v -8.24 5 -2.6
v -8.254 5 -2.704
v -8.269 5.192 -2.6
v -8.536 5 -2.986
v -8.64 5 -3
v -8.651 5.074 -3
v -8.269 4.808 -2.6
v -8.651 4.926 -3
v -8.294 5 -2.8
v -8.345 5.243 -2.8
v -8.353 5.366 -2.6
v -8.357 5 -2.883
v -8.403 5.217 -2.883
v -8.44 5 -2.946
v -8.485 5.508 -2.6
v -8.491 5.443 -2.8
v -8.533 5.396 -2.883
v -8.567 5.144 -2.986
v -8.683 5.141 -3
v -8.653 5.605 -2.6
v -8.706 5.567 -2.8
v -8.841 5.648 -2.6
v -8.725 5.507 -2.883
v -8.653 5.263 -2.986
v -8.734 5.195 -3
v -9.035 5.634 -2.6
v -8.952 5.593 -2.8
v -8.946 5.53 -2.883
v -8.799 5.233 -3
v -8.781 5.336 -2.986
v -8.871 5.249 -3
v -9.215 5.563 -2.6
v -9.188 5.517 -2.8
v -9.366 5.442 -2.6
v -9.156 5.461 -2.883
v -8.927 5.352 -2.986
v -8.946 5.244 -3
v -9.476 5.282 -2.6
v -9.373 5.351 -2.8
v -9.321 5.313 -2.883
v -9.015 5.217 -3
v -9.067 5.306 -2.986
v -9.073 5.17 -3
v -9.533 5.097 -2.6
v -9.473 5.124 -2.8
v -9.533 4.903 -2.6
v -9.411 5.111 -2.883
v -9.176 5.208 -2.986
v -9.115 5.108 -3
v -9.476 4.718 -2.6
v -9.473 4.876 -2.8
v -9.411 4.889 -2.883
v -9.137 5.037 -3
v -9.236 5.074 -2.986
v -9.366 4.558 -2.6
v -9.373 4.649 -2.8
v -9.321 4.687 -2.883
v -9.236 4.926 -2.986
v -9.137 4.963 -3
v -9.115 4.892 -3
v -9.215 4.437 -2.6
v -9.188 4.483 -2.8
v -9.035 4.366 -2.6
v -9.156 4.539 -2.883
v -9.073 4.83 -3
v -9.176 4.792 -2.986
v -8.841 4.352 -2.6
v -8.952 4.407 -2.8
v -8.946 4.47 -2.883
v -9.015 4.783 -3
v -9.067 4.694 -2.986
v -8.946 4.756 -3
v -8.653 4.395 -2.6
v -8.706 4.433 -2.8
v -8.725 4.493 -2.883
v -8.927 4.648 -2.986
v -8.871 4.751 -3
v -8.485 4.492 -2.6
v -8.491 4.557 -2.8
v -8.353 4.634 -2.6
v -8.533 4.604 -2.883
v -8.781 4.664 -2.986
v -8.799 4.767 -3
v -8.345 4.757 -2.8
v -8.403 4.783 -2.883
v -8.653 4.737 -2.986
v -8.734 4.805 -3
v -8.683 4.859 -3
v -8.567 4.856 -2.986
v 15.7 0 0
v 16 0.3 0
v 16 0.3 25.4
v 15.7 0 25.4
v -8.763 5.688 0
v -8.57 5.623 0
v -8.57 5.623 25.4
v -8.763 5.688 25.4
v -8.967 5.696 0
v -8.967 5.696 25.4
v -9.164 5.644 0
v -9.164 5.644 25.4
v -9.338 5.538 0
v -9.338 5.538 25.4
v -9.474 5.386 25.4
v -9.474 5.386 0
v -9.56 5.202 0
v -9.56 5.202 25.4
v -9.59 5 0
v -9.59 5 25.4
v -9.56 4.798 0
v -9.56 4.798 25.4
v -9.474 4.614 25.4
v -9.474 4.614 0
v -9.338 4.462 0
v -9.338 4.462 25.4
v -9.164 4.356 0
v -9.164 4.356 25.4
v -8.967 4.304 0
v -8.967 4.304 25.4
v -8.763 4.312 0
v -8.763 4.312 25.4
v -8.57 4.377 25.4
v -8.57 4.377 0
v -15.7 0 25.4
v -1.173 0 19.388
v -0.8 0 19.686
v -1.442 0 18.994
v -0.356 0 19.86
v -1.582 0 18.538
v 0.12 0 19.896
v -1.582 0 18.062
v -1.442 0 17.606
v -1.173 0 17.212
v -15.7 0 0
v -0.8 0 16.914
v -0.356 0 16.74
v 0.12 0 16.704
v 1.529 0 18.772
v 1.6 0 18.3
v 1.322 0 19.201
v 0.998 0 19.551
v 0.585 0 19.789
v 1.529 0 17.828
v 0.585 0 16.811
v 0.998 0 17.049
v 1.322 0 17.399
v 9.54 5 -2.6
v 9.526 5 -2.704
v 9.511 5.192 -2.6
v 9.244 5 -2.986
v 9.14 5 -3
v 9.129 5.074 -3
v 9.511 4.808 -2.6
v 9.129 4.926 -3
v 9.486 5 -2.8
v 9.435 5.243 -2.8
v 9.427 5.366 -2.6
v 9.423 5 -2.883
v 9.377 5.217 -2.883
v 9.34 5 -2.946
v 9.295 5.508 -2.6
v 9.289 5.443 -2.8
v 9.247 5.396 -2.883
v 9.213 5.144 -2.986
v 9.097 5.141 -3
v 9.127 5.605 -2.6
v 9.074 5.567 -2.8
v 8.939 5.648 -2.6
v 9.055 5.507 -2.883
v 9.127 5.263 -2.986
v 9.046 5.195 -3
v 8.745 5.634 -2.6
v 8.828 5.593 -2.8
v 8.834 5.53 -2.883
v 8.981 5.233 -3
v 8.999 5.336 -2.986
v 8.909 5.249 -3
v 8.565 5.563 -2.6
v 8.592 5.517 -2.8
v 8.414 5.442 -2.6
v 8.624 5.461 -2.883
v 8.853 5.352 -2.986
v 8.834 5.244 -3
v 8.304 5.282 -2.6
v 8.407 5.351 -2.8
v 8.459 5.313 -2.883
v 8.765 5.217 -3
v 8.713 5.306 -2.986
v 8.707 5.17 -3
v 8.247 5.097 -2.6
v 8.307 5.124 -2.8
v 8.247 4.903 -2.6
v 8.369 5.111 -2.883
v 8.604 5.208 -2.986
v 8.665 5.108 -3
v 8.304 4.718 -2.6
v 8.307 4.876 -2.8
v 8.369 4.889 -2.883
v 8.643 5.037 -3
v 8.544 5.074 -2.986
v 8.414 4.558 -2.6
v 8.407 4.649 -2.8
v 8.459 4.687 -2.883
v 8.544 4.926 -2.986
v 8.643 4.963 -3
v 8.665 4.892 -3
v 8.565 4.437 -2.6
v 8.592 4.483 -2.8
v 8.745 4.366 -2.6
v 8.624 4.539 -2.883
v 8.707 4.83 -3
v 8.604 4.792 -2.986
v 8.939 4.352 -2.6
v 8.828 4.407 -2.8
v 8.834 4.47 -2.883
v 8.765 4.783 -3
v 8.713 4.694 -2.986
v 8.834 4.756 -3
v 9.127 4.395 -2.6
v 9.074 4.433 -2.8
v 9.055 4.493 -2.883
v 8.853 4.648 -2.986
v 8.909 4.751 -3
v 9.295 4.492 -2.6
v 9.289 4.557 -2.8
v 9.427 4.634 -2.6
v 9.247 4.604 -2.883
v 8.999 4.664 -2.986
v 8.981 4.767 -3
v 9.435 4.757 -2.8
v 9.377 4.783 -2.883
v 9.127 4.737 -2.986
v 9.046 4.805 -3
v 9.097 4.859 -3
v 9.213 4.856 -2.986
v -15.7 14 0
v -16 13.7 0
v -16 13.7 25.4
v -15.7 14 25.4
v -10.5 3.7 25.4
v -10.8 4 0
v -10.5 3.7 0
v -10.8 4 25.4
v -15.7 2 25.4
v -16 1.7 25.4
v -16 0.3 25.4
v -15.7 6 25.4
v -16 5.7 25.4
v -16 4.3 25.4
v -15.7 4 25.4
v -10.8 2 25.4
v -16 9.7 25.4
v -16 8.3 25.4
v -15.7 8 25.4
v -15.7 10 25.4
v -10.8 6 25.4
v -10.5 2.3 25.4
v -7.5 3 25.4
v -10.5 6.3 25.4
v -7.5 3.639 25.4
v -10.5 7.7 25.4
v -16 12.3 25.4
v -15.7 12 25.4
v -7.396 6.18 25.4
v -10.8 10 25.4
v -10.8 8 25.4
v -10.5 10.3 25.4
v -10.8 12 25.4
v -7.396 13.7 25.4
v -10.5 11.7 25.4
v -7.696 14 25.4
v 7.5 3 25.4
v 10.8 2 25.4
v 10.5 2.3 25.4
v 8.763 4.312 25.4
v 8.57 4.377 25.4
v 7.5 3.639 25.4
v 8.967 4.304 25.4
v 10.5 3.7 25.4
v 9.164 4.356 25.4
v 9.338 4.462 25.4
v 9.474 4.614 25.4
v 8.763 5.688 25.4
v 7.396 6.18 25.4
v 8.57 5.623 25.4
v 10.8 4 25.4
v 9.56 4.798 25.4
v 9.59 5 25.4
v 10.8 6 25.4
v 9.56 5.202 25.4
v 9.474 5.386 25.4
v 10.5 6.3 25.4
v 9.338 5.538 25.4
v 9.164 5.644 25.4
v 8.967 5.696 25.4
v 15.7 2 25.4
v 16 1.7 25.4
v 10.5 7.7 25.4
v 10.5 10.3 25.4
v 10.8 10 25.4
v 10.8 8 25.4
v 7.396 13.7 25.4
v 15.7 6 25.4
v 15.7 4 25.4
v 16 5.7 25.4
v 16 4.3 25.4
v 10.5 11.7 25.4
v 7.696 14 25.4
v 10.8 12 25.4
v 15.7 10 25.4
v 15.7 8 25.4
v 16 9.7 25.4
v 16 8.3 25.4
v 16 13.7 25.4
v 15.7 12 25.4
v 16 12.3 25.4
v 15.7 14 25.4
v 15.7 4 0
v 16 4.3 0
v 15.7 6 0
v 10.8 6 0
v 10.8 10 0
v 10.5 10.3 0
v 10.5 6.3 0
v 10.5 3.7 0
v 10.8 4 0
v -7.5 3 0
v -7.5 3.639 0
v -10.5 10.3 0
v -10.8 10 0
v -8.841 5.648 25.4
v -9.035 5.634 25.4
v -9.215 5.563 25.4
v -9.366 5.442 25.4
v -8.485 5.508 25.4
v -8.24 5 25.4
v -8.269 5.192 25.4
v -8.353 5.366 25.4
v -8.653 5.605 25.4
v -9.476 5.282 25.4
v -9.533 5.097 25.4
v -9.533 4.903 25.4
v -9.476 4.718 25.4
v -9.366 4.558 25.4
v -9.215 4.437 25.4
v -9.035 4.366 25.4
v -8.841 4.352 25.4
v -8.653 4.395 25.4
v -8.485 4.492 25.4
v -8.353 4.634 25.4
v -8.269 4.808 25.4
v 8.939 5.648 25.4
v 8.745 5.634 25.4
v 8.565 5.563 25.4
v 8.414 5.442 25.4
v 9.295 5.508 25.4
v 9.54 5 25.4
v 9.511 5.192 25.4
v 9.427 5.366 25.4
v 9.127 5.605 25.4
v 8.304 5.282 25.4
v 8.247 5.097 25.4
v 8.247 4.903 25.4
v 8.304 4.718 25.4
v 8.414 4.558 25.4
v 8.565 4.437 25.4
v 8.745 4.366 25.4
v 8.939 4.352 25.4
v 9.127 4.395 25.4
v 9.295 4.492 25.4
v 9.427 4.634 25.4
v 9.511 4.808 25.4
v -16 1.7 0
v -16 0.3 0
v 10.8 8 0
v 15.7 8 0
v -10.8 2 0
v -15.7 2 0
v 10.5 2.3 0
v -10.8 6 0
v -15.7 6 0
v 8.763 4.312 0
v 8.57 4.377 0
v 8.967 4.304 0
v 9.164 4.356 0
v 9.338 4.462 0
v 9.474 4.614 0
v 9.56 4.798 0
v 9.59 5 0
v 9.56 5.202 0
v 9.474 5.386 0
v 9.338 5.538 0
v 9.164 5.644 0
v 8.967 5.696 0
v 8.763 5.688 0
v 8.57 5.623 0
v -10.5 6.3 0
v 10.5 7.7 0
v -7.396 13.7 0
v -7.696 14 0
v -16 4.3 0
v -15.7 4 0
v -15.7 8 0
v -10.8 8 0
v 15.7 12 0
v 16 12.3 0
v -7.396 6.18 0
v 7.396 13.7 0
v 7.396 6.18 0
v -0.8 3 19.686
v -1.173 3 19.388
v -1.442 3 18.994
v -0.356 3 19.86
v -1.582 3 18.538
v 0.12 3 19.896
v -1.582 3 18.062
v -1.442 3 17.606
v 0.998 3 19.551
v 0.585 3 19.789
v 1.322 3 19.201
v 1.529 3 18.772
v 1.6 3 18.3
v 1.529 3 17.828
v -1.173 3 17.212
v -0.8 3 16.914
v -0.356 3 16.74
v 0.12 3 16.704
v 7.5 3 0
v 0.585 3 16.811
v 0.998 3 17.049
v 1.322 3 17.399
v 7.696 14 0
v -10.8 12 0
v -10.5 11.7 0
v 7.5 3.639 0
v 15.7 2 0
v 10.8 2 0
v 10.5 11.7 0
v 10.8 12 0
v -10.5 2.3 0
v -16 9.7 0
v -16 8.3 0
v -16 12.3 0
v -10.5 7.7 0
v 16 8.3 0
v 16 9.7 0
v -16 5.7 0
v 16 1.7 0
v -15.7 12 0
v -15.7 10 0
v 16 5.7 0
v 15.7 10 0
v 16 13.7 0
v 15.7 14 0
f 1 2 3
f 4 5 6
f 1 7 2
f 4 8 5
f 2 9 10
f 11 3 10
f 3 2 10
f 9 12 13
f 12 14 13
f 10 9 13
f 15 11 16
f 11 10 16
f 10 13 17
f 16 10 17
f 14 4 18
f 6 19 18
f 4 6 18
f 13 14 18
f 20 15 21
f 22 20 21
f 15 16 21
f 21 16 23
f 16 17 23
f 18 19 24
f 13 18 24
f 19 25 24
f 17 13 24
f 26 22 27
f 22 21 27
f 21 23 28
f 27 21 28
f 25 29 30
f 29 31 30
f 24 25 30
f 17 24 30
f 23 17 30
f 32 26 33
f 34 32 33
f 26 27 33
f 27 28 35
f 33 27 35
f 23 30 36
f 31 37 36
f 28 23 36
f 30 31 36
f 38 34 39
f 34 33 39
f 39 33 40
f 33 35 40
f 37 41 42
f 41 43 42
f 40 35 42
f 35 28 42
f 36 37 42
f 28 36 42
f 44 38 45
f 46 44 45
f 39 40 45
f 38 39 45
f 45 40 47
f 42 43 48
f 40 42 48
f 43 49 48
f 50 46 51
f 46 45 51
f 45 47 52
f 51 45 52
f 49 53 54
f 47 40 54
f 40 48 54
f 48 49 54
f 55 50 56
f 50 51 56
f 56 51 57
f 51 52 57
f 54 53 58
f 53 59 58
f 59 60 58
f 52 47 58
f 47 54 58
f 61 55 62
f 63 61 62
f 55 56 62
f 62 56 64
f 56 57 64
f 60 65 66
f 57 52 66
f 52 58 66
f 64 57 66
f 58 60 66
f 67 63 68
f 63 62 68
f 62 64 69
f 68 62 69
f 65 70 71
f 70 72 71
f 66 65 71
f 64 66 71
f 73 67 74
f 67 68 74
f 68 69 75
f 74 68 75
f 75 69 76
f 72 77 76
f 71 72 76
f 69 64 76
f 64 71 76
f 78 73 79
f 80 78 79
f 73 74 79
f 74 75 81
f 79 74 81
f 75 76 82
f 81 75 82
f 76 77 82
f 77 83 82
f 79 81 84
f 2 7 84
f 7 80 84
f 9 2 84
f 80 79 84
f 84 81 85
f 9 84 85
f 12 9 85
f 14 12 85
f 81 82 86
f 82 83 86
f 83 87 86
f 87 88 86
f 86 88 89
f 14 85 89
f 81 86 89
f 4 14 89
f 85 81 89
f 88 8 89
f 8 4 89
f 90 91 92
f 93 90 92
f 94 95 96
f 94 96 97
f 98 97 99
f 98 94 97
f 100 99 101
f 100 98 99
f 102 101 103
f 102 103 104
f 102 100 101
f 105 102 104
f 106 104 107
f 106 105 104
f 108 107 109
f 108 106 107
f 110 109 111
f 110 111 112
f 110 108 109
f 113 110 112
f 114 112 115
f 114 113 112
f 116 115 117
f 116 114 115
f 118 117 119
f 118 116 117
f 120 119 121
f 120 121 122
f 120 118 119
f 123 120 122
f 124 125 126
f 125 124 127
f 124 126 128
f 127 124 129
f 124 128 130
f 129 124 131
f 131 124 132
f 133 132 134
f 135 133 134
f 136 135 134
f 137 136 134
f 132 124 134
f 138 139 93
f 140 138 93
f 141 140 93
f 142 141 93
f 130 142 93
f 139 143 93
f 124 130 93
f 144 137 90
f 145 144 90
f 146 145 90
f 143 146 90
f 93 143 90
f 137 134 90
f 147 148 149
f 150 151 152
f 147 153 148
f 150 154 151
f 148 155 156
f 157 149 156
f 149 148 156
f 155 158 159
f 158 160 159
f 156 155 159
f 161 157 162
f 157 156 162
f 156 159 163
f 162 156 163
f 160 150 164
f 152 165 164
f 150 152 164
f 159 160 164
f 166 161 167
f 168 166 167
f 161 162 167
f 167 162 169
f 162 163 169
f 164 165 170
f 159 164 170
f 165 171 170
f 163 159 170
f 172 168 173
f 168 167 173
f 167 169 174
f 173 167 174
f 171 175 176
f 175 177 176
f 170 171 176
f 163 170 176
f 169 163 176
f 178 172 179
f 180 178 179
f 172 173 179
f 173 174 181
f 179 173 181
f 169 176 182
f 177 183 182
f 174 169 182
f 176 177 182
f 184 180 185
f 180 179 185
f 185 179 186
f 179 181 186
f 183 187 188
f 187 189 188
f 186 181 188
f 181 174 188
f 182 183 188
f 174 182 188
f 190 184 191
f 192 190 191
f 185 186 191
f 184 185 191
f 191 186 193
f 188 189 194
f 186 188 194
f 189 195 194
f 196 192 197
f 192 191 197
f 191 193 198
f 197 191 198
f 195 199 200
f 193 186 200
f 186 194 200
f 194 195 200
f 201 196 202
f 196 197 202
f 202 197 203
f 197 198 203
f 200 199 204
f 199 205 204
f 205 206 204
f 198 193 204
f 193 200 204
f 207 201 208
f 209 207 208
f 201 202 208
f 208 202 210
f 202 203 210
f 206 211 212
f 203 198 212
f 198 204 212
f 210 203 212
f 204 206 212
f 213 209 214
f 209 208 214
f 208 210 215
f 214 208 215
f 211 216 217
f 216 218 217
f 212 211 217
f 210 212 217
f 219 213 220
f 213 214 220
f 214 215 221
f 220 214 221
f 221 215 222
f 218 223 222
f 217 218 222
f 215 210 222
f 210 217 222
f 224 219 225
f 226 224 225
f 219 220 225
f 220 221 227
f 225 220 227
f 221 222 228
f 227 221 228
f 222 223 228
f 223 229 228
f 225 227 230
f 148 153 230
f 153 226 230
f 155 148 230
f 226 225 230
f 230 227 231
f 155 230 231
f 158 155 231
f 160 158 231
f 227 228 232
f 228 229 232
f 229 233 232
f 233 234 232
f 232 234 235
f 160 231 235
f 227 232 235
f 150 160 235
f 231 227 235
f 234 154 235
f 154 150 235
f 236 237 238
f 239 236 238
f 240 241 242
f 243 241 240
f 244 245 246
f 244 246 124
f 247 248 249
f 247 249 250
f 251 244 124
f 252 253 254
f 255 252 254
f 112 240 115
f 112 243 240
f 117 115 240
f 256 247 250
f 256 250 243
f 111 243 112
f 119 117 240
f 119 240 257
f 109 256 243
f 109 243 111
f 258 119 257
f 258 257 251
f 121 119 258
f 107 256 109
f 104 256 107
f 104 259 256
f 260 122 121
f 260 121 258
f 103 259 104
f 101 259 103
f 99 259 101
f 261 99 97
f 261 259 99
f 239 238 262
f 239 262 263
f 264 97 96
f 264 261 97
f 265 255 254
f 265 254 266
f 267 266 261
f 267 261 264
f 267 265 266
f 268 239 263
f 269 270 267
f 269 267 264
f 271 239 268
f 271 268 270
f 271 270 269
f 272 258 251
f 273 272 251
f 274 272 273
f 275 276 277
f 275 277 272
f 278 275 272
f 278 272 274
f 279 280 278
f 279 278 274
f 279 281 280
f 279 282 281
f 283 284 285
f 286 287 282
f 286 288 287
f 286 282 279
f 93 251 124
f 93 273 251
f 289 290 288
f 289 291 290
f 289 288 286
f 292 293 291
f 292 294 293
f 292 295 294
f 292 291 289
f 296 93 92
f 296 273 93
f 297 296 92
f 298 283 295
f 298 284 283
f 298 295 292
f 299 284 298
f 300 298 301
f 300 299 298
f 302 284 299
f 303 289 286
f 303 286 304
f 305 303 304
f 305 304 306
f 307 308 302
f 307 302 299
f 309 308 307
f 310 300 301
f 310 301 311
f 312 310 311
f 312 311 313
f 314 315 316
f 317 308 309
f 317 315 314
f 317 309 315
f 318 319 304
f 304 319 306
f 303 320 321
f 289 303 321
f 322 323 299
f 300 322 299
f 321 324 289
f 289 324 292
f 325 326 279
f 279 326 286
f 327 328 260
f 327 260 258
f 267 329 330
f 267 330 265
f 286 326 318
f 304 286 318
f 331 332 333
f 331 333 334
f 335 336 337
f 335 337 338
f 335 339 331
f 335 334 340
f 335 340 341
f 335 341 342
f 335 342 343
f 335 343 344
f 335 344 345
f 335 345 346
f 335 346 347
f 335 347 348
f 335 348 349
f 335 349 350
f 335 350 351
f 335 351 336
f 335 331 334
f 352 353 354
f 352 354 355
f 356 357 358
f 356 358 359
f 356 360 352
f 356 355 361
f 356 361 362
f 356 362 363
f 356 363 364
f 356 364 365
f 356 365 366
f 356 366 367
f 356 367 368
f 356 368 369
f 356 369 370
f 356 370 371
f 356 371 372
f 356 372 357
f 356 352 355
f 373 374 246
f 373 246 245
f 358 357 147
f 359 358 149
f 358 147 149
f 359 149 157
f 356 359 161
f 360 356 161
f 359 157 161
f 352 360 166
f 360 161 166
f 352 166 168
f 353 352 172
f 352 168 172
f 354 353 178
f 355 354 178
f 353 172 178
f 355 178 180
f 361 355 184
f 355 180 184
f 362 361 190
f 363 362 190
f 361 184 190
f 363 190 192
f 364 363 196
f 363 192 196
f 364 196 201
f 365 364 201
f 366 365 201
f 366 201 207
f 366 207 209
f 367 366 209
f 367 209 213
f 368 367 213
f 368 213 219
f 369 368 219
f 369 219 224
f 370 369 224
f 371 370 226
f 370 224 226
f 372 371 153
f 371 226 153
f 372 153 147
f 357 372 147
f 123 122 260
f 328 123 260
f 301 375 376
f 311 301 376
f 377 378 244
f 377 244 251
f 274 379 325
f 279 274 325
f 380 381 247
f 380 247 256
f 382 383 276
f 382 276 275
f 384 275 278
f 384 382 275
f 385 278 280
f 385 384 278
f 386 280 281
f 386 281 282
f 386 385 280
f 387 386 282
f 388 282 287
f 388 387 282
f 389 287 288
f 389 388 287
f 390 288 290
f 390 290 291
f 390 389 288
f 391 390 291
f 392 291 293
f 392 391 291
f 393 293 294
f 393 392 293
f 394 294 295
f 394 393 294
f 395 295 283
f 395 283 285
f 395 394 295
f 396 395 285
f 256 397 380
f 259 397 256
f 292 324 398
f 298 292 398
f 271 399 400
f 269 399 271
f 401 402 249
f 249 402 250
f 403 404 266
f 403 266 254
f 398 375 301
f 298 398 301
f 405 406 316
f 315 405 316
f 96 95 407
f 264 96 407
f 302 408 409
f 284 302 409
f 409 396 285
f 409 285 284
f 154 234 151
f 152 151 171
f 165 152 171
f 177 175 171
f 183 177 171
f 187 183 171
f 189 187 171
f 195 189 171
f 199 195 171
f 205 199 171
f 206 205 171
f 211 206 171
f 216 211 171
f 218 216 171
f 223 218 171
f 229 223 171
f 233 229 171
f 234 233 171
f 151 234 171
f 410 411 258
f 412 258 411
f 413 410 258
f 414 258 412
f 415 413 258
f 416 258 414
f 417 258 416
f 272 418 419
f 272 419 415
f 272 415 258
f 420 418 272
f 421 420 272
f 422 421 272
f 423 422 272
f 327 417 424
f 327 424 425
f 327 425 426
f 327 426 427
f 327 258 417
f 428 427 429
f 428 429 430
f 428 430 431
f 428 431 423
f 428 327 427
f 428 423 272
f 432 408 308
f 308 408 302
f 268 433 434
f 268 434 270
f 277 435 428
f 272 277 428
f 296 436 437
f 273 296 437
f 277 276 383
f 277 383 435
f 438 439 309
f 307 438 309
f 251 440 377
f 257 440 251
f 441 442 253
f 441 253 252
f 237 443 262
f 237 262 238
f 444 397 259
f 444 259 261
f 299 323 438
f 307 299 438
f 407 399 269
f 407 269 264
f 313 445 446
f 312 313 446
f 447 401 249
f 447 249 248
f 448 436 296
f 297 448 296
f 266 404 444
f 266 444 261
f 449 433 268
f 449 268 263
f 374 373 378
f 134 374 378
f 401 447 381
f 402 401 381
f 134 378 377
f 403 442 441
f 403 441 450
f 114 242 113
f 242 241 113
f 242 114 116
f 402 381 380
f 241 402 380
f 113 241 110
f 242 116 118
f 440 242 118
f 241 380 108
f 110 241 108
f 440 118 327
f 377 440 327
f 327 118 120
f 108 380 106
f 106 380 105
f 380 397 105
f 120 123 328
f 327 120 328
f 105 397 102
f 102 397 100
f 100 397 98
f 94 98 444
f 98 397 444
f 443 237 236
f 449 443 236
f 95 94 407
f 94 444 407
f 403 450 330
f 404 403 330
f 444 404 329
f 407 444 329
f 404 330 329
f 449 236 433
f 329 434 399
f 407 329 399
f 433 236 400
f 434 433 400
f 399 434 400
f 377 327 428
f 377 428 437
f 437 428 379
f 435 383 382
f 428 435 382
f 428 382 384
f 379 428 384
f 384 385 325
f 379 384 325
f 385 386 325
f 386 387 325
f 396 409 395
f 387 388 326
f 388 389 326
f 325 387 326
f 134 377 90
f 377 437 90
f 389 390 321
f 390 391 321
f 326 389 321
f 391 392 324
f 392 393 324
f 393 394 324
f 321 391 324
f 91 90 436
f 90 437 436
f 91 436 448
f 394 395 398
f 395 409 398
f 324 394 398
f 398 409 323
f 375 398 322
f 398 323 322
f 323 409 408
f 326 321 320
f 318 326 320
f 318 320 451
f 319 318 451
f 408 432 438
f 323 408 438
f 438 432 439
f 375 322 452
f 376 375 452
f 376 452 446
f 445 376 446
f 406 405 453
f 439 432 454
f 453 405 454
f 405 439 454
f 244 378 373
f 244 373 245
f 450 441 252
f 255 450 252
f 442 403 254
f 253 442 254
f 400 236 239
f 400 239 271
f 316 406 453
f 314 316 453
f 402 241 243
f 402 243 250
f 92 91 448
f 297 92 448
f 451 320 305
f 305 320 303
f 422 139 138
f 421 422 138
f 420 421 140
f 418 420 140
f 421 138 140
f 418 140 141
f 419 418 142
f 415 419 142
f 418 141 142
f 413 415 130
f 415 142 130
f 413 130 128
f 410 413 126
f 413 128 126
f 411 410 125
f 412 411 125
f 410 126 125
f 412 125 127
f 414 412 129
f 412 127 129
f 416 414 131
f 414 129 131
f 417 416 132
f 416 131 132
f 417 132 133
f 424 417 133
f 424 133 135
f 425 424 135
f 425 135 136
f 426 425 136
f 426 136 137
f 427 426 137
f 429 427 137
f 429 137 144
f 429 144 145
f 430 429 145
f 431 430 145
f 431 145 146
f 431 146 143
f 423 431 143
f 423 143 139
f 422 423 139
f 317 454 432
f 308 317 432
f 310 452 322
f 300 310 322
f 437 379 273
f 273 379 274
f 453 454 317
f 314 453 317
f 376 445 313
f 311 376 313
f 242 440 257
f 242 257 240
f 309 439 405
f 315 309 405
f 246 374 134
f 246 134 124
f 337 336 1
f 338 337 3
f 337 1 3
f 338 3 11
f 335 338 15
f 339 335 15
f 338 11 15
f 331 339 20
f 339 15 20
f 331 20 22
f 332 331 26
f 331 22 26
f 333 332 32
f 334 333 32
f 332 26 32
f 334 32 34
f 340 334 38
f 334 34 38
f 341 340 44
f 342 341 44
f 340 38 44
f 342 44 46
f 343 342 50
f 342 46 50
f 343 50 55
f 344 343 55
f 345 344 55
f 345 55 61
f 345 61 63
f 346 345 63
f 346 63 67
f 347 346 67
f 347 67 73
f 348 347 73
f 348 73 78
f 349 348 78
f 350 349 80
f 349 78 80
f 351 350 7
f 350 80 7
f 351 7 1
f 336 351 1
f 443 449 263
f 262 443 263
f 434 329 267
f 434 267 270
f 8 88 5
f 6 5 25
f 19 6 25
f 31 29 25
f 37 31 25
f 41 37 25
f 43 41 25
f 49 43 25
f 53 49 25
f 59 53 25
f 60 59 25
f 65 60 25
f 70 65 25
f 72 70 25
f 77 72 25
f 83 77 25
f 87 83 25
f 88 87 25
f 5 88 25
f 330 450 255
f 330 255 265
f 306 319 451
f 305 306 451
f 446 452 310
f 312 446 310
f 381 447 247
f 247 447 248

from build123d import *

# Parameters (mm, degrees)
PAD_DEPTH       = 25.4
SKETCH001_R     = 1.6
POCKET_DEPTH    = 14.001
CHAMFER_SIZE    = 0.3
CHAMFER001_SIZE = 0.3
CHAMFER002_SIZE = 0.3
CHAMFER003_SIZE = 0.3
CHAMFER004_SIZE = 0.3
SKETCH002_R     = 0.65
PAD001_DEPTH    = 28.4
FILLET_R        = 0.4
SKETCH003_R     = 0.65
PAD002_DEPTH    = 28.4
FILLET001_R     = 0.4


with BuildPart() as body:
    # Sketch → Pad (new body)
    with BuildSketch(Plane.XY):
        with BuildLine():
            Line((-16, 0), (16, 0))
            Line((16, 0), (16, 2))
            Line((16, 2), (10.5, 2))
            Line((10.5, 2), (10.5, 4))
            Line((10.5, 4), (16, 4))
            Line((16, 4), (16, 6))
            Line((16, 6), (10.5, 6))
            Line((10.5, 6), (10.5, 8))
            Line((10.5, 8), (16, 8))
            Line((16, 8), (16, 10))
            Line((16, 10), (10.5, 10))
            Line((10.5, 10), (10.5, 12))
            Line((10.5, 12), (16, 12))
            Line((16, 12), (16, 14))
            Line((16, 14), (7.395549, 14))
            Line((7.395549, 14), (7.395549, 6.18))
            Line((8.569968, 5.622559), (7.395549, 6.18))
            ThreePointArc((8.569968, 4.377441), (9.59, 5), (8.569968, 5.622559))
            Line((8.569968, 4.377441), (7.5, 3.639086))
            Line((7.5, 3.639086), (7.5, 3))
            Line((-7.5, 3), (7.5, 3))
            Line((-7.5, 3.639086), (-7.5, 3))
            Line((-8.569968, 4.377441), (-7.5, 3.639086))
            ThreePointArc((-8.569968, 5.622559), (-9.59, 5), (-8.569968, 4.377441))
            Line((-8.569968, 5.622559), (-7.395549, 6.18))
            Line((-7.395549, 14), (-7.395549, 6.18))
            Line((-16, 14), (-7.395549, 14))
            Line((-16, 12), (-16, 14))
            Line((-10.5, 12), (-16, 12))
            Line((-10.5, 10), (-10.5, 12))
            Line((-16, 10), (-10.5, 10))
            Line((-16, 8), (-16, 10))
            Line((-10.5, 8), (-16, 8))
            Line((-10.5, 6), (-10.5, 8))
            Line((-16, 6), (-10.5, 6))
            Line((-16, 4), (-16, 6))
            Line((-10.5, 4), (-16, 4))
            Line((-10.5, 2), (-10.5, 4))
            Line((-16, 2), (-10.5, 2))
            Line((-16, 0), (-16, 2))
        make_face()
    extrude(amount=PAD_DEPTH)

    # Sketch001 (on Face2 of Pad) → Pocket (cut, through all)
    with BuildSketch(Plane.XZ):
        with Locations((0, 18.3)):
            Circle(SKETCH001_R)
    extrude(amount=-POCKET_DEPTH, mode=Mode.SUBTRACT)

    # Chamfer
    chamfer_edges = [body.edges().sort_by_distance(p)[0] for p in [
        (-16, 14, 12.7),
        (-16, 12, 12.7),
        (-16, 10, 12.7),
        (-16, 8, 12.7),
        (-16, 6, 12.7),
        (-16, 4, 12.7),
        (-16, 2, 12.7),
        (-16, 0, 12.7),
    ]]
    chamfer(chamfer_edges, length=CHAMFER_SIZE)

    # Chamfer001
    chamfer001_edges = [body.edges().sort_by_distance(p)[0] for p in [
        (-10.5, 12, 12.7),
        (-10.5, 8, 12.7),
        (-10.5, 4, 12.7),
        (-10.5, 10, 12.7),
        (-10.5, 6, 12.7),
        (-10.5, 2, 12.7),
    ]]
    chamfer(chamfer001_edges, length=CHAMFER001_SIZE)

    # Chamfer002
    chamfer002_edges = [body.edges().sort_by_distance(p)[0] for p in [
        (16, 14, 12.7),
        (16, 12, 12.7),
        (16, 10, 12.7),
        (16, 8, 12.7),
        (16, 6, 12.7),
        (16, 4, 12.7),
        (16, 2, 12.7),
        (16, 0, 12.7),
    ]]
    chamfer(chamfer002_edges, length=CHAMFER002_SIZE)

    # Chamfer003
    chamfer003_edges = [body.edges().sort_by_distance(p)[0] for p in [
        (10.5, 2, 12.7),
        (10.5, 6, 12.7),
        (10.5, 10, 12.7),
        (10.5, 4, 12.7),
        (10.5, 8, 12.7),
        (10.5, 12, 12.7),
    ]]
    chamfer(chamfer003_edges, length=CHAMFER003_SIZE)

    # Chamfer004
    chamfer004_edges = [body.edges().sort_by_distance(p)[0] for p in [
        (-7.395549, 14, 12.7),
        (7.395549, 14, 12.7),
    ]]
    chamfer(chamfer004_edges, length=CHAMFER004_SIZE)


with BuildPart() as body001:
    # Sketch002 → Pad001 (new body)
    with BuildSketch(Plane.XY.offset(-3)):
        with Locations((-8.89, 5)):
            Circle(SKETCH002_R)
    extrude(amount=PAD001_DEPTH)

    # Fillet
    fillet_edges = [body001.edges().sort_by_distance(p)[0] for p in [
        (-9.54, 5, -3),
    ]]
    fillet(fillet_edges, radius=FILLET_R)


with BuildPart() as body002:
    # Sketch003 → Pad002 (new body)
    with BuildSketch(Plane.XY.offset(-3)):
        with Locations((8.89, 5)):
            Circle(SKETCH003_R)
    extrude(amount=PAD002_DEPTH)

    # Fillet001
    fillet001_edges = [body002.edges().sort_by_distance(p)[0] for p in [
        (8.24, 5, -3),
    ]]
    fillet(fillet001_edges, radius=FILLET001_R)


solid = Compound([body.part, body001.part, body002.part])
